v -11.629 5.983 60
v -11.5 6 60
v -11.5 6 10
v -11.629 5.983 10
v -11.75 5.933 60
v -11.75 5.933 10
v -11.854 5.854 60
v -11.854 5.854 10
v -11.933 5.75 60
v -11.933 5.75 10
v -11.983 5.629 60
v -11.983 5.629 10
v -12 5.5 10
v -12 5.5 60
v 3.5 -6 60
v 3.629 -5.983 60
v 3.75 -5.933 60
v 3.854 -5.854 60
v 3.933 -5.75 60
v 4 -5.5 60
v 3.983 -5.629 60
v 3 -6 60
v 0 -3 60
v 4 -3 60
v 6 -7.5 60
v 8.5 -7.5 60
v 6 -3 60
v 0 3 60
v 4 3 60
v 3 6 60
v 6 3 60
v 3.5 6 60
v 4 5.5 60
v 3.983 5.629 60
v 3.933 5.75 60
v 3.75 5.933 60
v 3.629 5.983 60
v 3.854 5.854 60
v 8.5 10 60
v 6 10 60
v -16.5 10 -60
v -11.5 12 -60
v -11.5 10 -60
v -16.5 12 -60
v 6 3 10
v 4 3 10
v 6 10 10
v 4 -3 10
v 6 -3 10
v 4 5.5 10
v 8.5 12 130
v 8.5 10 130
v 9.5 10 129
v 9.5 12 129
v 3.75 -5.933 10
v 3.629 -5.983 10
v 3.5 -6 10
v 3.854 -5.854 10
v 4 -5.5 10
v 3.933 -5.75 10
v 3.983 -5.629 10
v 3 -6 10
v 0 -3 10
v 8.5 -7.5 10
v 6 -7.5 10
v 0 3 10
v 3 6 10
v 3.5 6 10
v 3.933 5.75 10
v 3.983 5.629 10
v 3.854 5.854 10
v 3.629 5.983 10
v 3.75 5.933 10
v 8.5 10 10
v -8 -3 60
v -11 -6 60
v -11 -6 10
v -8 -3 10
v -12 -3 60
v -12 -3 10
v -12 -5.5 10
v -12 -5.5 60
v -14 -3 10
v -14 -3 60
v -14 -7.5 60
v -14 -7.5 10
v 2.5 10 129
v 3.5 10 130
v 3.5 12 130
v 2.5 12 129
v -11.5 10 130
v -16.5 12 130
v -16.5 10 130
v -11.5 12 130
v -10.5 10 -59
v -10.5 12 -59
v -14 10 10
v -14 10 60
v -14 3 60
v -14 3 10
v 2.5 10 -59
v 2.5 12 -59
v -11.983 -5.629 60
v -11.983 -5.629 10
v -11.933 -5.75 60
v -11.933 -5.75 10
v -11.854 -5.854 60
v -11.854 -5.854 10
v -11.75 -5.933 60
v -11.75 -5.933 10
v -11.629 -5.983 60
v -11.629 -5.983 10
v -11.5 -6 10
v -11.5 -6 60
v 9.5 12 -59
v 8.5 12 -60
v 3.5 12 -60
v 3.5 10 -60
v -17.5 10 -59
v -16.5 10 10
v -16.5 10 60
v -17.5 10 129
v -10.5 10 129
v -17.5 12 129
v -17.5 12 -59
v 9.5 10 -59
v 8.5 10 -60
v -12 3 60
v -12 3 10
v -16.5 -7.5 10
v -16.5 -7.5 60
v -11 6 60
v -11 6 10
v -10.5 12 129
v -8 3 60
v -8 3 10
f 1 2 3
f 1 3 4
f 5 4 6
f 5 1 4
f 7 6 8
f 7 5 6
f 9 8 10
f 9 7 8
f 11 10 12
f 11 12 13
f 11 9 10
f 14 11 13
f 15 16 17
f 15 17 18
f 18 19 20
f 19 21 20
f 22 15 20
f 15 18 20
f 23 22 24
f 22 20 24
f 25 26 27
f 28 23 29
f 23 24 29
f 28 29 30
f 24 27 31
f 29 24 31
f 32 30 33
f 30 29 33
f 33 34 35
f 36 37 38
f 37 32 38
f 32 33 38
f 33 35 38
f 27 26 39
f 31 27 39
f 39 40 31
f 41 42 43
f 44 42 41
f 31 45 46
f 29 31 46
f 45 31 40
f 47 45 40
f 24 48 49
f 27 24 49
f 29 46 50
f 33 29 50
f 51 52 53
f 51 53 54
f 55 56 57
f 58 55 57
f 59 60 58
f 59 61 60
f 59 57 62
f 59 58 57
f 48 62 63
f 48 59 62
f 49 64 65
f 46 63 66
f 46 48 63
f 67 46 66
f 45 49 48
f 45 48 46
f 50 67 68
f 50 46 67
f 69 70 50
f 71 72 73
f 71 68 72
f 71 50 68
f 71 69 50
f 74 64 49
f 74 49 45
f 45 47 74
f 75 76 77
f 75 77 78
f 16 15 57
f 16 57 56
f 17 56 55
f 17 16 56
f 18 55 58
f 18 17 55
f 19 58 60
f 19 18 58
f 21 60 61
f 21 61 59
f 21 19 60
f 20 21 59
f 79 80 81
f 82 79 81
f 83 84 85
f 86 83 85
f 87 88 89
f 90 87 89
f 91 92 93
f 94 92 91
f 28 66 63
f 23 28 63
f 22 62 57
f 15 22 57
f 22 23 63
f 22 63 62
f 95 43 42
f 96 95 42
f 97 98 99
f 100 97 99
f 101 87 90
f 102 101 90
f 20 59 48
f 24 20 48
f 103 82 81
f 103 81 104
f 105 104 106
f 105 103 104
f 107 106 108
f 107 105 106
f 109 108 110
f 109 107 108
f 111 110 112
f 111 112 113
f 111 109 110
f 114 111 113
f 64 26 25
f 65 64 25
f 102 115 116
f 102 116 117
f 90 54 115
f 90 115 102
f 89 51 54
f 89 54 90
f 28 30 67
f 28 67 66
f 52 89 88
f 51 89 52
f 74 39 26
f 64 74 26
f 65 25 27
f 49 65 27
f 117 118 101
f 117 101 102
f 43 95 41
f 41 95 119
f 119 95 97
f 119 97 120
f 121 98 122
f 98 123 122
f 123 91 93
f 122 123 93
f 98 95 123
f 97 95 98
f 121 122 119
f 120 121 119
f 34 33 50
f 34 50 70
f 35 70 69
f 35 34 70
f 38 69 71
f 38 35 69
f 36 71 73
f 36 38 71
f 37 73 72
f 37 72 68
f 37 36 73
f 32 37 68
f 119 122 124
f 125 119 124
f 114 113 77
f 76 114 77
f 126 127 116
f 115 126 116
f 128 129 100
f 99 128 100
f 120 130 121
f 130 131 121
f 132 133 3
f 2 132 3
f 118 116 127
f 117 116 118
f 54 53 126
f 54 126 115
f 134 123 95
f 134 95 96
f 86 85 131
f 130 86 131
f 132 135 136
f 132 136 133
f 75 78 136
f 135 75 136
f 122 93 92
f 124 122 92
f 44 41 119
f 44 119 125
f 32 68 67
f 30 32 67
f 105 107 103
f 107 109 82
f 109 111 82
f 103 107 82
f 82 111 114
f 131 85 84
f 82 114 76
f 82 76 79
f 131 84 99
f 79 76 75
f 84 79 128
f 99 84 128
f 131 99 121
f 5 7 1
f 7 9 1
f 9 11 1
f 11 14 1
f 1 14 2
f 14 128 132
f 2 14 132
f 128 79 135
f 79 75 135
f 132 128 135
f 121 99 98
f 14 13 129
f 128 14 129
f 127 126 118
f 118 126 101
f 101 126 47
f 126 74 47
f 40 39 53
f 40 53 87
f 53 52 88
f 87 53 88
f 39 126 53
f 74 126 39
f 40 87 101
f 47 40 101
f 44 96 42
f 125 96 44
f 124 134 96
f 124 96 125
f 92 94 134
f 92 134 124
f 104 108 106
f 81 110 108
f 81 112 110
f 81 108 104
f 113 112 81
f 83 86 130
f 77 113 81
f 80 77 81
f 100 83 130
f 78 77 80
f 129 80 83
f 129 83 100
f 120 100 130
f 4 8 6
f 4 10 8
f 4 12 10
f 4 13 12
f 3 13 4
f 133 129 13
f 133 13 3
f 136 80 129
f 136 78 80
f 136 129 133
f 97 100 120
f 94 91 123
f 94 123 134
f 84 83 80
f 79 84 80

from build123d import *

# Parameters (mm, degrees)
ESTRUSIONE_ESTRUSIONE1_DEPTH = 70
ESTRUSIONE_ESTRUSIONE2_DEPTH = 70
ESTRUSIONE_ESTRUSIONE3_DEPTH = 70
ESTRUSIONE_ESTRUSIONE4_DEPTH = 70
SCHIZZO4_W                   = 25
SCHIZZO4_H                   = 2
ESTRUSIONE_ESTRUSIONE5_DEPTH = 70
SCHIZZO6_W                   = 7
SCHIZZO6_H                   = 70
ESTRUSIONE_ESTRUSIONE6_DEPTH = 2
SCHIZZO6_3_W                 = 13
SCHIZZO6_3_H                 = 70
TAGLIO_ESTRUSIONE1_DEPTH     = 2
RACCORDO1_R                  = 0.5
RACCORDO2_R                  = 0.5
SCHIZZO7_W                   = 7
SCHIZZO7_H                   = 2
ESTRUSIONE_ESTRUSIONE8_DEPTH = 60
SCHIZZO8_W                   = 7
SCHIZZO8_H                   = 2
ESTRUSIONE_ESTRUSIONE9_DEPTH = 60
SCHIZZO9_W                   = 10
SCHIZZO9_H                   = 17.5
TAGLIO_ESTRUSIONE2_DEPTH     = 60
SMUSSO1_SIZE                 = 1
SMUSSO2_SIZE                 = 1


with BuildPart() as part:
    # Schizzo1 → Estrusione-Estrusione1 (new body)
    with BuildSketch(Plane.XY):
        Polygon((0, -3), (3, -6), (4, -6), (4, -3), (6, -3), (6, 3), (4, 3), (4, 6), (3, 6), (0, 3), align=None)
    extrude(amount=ESTRUSIONE_ESTRUSIONE1_DEPTH)

    # Schizzo2 → Estrusione-Estrusione2 (add)
    with BuildSketch(Plane.XY.offset(70)):
        Polygon((6, 3), (6, 12), (8.5, 12), (8.5, -7.5), (6, -7.5), (6, -3), (4, -3), (4, -6), (3, -6), (0, -3), (0, 3), (3, 6), (4, 6), (4, 3), align=None)
    extrude(amount=-ESTRUSIONE_ESTRUSIONE2_DEPTH)



with BuildPart() as body_2:
    # Schizzo1<3> → Estrusione-Estrusione3 (new body)
    with BuildSketch(Plane.XY):
        Polygon((-12, 6), (-12, 3), (-14, 3), (-14, -3), (-12, -3), (-12, -6), (-11, -6), (-8, -3), (-8, 3), (-11, 6), align=None)
    extrude(amount=ESTRUSIONE_ESTRUSIONE3_DEPTH)

    # Schizzo3 → Estrusione-Estrusione4 (add)
    with BuildSketch(Plane.XY.offset(70)):
        Polygon((-14, -3), (-14, -7.5), (-16.5, -7.5), (-16.5, 12), (-14, 12), (-14, 3), (-12, 3), (-12, 6), (-11, 6), (-8, 3), (-8, -3), (-11, -6), (-12, -6), (-12, -3), align=None)
    extrude(amount=-ESTRUSIONE_ESTRUSIONE4_DEPTH)


with BuildPart() as part_1:
    add(part.part)

    add(body_2.part)  # Estrusione-Estrusione5 merges body 2
    # Schizzo4 → Estrusione-Estrusione5 (add)
    with BuildSketch(Plane.XY.offset(70)):
        with Locations((-4, 11)):
            Rectangle(SCHIZZO4_W, SCHIZZO4_H)
    extrude(amount=-ESTRUSIONE_ESTRUSIONE5_DEPTH)

    # Schizzo6 → Estrusione-Estrusione6 (add)
    with BuildSketch(Plane(origin=(0, 12, 0), x_dir=(1, 0, 0), z_dir=(0, 1, 0))):
        with Locations((-14, -35)):
            Rectangle(SCHIZZO6_W, SCHIZZO6_H)
        with Locations((6, -35)):
            Rectangle(SCHIZZO6_W, SCHIZZO6_H)
    extrude(amount=-ESTRUSIONE_ESTRUSIONE6_DEPTH)

    # Schizzo6<3> → Taglio-Estrusione1 (cut)
    with BuildSketch(Plane(origin=(0, 12, 0), x_dir=(1, 0, 0), z_dir=(0, 1, 0))):
        with Locations((-4, -35)):
            Rectangle(SCHIZZO6_3_W, SCHIZZO6_3_H)
    extrude(amount=-TAGLIO_ESTRUSIONE1_DEPTH, mode=Mode.SUBTRACT)


with BuildPart() as taglio_estrusione1_piece_1:
    # of the separate pieces the step leaves, piece 1, a body of its own (taglio_estrusione1_pieces)
    add(part_1.part.solids().sort_by_distance((2.5, 12, 0))[0])

    # Raccordo1
    raccordo1_edges = [taglio_estrusione1_piece_1.edges().sort_by_distance(p)[0] for p in [
        (4, 6, 35),
        (4, -6, 35),
    ]]
    fillet(raccordo1_edges, radius=RACCORDO1_R)



with BuildPart() as taglio_estrusione1_piece_2:
    # of the separate pieces the step leaves, piece 2, a body of its own (taglio_estrusione1_pieces)
    add(part_1.part.solids().sort_by_distance((-12, 6, 0))[0])

    # Raccordo2
    raccordo2_edges = [taglio_estrusione1_piece_2.edges().sort_by_distance(p)[0] for p in [
        (-12, -6, 35),
        (-12, 6, 35),
    ]]
    fillet(raccordo2_edges, radius=RACCORDO2_R)


with BuildPart() as taglio_estrusione1_piece_1_1:
    add(taglio_estrusione1_piece_1.part)

    add(taglio_estrusione1_piece_2.part)  # Estrusione-Estrusione8 merges Taglio-Estrusione1 piece 2
    # Schizzo7 → Estrusione-Estrusione8 (add)
    with BuildSketch(Plane.XY.offset(70)):
        with Locations((-14, 11)):
            Rectangle(SCHIZZO7_W, SCHIZZO7_H)
        with Locations((6, 11)):
            Rectangle(SCHIZZO7_W, SCHIZZO7_H)
    extrude(amount=ESTRUSIONE_ESTRUSIONE8_DEPTH)

    # Schizzo8 → Estrusione-Estrusione9 (add)
    with BuildSketch(Plane(origin=(0, 0, 0), x_dir=(-1, 0, 0), z_dir=(0, 0, -1))):
        with Locations((-6, 11)):
            Rectangle(SCHIZZO8_W, SCHIZZO8_H)
        with Locations((14, 11)):
            Rectangle(SCHIZZO8_W, SCHIZZO8_H)
    extrude(amount=ESTRUSIONE_ESTRUSIONE9_DEPTH)

    # Schizzo9 → Taglio-Estrusione2 (cut)
    with BuildSketch(Plane(origin=(8.5, 0, 0), x_dir=(0, 0, -1), z_dir=(1, 0, 0))):
        with Locations((-65, 1.25)):
            Rectangle(SCHIZZO9_W, SCHIZZO9_H)
        with Locations((-5, 1.25)):
            Rectangle(SCHIZZO9_W, SCHIZZO9_H)
    extrude(amount=-TAGLIO_ESTRUSIONE2_DEPTH, mode=Mode.SUBTRACT)

    # Smusso1
    smusso1_edges = [taglio_estrusione1_piece_1_1.edges().sort_by_distance(p)[0] for p in [
        (-17.5, 11, -60),
        (-10.5, 11, -60),
        (-10.5, 11, 130),
        (-17.5, 11, 130),
    ]]
    chamfer(smusso1_edges, length=SMUSSO1_SIZE)

    # Smusso2
    smusso2_edges = [taglio_estrusione1_piece_1_1.edges().sort_by_distance(p)[0] for p in [
        (2.5, 11, 130),
        (9.5, 11, 130),
        (9.5, 11, -60),
        (2.5, 11, -60),
    ]]
    chamfer(smusso2_edges, length=SMUSSO2_SIZE)


solid = taglio_estrusione1_piece_1_1.part
